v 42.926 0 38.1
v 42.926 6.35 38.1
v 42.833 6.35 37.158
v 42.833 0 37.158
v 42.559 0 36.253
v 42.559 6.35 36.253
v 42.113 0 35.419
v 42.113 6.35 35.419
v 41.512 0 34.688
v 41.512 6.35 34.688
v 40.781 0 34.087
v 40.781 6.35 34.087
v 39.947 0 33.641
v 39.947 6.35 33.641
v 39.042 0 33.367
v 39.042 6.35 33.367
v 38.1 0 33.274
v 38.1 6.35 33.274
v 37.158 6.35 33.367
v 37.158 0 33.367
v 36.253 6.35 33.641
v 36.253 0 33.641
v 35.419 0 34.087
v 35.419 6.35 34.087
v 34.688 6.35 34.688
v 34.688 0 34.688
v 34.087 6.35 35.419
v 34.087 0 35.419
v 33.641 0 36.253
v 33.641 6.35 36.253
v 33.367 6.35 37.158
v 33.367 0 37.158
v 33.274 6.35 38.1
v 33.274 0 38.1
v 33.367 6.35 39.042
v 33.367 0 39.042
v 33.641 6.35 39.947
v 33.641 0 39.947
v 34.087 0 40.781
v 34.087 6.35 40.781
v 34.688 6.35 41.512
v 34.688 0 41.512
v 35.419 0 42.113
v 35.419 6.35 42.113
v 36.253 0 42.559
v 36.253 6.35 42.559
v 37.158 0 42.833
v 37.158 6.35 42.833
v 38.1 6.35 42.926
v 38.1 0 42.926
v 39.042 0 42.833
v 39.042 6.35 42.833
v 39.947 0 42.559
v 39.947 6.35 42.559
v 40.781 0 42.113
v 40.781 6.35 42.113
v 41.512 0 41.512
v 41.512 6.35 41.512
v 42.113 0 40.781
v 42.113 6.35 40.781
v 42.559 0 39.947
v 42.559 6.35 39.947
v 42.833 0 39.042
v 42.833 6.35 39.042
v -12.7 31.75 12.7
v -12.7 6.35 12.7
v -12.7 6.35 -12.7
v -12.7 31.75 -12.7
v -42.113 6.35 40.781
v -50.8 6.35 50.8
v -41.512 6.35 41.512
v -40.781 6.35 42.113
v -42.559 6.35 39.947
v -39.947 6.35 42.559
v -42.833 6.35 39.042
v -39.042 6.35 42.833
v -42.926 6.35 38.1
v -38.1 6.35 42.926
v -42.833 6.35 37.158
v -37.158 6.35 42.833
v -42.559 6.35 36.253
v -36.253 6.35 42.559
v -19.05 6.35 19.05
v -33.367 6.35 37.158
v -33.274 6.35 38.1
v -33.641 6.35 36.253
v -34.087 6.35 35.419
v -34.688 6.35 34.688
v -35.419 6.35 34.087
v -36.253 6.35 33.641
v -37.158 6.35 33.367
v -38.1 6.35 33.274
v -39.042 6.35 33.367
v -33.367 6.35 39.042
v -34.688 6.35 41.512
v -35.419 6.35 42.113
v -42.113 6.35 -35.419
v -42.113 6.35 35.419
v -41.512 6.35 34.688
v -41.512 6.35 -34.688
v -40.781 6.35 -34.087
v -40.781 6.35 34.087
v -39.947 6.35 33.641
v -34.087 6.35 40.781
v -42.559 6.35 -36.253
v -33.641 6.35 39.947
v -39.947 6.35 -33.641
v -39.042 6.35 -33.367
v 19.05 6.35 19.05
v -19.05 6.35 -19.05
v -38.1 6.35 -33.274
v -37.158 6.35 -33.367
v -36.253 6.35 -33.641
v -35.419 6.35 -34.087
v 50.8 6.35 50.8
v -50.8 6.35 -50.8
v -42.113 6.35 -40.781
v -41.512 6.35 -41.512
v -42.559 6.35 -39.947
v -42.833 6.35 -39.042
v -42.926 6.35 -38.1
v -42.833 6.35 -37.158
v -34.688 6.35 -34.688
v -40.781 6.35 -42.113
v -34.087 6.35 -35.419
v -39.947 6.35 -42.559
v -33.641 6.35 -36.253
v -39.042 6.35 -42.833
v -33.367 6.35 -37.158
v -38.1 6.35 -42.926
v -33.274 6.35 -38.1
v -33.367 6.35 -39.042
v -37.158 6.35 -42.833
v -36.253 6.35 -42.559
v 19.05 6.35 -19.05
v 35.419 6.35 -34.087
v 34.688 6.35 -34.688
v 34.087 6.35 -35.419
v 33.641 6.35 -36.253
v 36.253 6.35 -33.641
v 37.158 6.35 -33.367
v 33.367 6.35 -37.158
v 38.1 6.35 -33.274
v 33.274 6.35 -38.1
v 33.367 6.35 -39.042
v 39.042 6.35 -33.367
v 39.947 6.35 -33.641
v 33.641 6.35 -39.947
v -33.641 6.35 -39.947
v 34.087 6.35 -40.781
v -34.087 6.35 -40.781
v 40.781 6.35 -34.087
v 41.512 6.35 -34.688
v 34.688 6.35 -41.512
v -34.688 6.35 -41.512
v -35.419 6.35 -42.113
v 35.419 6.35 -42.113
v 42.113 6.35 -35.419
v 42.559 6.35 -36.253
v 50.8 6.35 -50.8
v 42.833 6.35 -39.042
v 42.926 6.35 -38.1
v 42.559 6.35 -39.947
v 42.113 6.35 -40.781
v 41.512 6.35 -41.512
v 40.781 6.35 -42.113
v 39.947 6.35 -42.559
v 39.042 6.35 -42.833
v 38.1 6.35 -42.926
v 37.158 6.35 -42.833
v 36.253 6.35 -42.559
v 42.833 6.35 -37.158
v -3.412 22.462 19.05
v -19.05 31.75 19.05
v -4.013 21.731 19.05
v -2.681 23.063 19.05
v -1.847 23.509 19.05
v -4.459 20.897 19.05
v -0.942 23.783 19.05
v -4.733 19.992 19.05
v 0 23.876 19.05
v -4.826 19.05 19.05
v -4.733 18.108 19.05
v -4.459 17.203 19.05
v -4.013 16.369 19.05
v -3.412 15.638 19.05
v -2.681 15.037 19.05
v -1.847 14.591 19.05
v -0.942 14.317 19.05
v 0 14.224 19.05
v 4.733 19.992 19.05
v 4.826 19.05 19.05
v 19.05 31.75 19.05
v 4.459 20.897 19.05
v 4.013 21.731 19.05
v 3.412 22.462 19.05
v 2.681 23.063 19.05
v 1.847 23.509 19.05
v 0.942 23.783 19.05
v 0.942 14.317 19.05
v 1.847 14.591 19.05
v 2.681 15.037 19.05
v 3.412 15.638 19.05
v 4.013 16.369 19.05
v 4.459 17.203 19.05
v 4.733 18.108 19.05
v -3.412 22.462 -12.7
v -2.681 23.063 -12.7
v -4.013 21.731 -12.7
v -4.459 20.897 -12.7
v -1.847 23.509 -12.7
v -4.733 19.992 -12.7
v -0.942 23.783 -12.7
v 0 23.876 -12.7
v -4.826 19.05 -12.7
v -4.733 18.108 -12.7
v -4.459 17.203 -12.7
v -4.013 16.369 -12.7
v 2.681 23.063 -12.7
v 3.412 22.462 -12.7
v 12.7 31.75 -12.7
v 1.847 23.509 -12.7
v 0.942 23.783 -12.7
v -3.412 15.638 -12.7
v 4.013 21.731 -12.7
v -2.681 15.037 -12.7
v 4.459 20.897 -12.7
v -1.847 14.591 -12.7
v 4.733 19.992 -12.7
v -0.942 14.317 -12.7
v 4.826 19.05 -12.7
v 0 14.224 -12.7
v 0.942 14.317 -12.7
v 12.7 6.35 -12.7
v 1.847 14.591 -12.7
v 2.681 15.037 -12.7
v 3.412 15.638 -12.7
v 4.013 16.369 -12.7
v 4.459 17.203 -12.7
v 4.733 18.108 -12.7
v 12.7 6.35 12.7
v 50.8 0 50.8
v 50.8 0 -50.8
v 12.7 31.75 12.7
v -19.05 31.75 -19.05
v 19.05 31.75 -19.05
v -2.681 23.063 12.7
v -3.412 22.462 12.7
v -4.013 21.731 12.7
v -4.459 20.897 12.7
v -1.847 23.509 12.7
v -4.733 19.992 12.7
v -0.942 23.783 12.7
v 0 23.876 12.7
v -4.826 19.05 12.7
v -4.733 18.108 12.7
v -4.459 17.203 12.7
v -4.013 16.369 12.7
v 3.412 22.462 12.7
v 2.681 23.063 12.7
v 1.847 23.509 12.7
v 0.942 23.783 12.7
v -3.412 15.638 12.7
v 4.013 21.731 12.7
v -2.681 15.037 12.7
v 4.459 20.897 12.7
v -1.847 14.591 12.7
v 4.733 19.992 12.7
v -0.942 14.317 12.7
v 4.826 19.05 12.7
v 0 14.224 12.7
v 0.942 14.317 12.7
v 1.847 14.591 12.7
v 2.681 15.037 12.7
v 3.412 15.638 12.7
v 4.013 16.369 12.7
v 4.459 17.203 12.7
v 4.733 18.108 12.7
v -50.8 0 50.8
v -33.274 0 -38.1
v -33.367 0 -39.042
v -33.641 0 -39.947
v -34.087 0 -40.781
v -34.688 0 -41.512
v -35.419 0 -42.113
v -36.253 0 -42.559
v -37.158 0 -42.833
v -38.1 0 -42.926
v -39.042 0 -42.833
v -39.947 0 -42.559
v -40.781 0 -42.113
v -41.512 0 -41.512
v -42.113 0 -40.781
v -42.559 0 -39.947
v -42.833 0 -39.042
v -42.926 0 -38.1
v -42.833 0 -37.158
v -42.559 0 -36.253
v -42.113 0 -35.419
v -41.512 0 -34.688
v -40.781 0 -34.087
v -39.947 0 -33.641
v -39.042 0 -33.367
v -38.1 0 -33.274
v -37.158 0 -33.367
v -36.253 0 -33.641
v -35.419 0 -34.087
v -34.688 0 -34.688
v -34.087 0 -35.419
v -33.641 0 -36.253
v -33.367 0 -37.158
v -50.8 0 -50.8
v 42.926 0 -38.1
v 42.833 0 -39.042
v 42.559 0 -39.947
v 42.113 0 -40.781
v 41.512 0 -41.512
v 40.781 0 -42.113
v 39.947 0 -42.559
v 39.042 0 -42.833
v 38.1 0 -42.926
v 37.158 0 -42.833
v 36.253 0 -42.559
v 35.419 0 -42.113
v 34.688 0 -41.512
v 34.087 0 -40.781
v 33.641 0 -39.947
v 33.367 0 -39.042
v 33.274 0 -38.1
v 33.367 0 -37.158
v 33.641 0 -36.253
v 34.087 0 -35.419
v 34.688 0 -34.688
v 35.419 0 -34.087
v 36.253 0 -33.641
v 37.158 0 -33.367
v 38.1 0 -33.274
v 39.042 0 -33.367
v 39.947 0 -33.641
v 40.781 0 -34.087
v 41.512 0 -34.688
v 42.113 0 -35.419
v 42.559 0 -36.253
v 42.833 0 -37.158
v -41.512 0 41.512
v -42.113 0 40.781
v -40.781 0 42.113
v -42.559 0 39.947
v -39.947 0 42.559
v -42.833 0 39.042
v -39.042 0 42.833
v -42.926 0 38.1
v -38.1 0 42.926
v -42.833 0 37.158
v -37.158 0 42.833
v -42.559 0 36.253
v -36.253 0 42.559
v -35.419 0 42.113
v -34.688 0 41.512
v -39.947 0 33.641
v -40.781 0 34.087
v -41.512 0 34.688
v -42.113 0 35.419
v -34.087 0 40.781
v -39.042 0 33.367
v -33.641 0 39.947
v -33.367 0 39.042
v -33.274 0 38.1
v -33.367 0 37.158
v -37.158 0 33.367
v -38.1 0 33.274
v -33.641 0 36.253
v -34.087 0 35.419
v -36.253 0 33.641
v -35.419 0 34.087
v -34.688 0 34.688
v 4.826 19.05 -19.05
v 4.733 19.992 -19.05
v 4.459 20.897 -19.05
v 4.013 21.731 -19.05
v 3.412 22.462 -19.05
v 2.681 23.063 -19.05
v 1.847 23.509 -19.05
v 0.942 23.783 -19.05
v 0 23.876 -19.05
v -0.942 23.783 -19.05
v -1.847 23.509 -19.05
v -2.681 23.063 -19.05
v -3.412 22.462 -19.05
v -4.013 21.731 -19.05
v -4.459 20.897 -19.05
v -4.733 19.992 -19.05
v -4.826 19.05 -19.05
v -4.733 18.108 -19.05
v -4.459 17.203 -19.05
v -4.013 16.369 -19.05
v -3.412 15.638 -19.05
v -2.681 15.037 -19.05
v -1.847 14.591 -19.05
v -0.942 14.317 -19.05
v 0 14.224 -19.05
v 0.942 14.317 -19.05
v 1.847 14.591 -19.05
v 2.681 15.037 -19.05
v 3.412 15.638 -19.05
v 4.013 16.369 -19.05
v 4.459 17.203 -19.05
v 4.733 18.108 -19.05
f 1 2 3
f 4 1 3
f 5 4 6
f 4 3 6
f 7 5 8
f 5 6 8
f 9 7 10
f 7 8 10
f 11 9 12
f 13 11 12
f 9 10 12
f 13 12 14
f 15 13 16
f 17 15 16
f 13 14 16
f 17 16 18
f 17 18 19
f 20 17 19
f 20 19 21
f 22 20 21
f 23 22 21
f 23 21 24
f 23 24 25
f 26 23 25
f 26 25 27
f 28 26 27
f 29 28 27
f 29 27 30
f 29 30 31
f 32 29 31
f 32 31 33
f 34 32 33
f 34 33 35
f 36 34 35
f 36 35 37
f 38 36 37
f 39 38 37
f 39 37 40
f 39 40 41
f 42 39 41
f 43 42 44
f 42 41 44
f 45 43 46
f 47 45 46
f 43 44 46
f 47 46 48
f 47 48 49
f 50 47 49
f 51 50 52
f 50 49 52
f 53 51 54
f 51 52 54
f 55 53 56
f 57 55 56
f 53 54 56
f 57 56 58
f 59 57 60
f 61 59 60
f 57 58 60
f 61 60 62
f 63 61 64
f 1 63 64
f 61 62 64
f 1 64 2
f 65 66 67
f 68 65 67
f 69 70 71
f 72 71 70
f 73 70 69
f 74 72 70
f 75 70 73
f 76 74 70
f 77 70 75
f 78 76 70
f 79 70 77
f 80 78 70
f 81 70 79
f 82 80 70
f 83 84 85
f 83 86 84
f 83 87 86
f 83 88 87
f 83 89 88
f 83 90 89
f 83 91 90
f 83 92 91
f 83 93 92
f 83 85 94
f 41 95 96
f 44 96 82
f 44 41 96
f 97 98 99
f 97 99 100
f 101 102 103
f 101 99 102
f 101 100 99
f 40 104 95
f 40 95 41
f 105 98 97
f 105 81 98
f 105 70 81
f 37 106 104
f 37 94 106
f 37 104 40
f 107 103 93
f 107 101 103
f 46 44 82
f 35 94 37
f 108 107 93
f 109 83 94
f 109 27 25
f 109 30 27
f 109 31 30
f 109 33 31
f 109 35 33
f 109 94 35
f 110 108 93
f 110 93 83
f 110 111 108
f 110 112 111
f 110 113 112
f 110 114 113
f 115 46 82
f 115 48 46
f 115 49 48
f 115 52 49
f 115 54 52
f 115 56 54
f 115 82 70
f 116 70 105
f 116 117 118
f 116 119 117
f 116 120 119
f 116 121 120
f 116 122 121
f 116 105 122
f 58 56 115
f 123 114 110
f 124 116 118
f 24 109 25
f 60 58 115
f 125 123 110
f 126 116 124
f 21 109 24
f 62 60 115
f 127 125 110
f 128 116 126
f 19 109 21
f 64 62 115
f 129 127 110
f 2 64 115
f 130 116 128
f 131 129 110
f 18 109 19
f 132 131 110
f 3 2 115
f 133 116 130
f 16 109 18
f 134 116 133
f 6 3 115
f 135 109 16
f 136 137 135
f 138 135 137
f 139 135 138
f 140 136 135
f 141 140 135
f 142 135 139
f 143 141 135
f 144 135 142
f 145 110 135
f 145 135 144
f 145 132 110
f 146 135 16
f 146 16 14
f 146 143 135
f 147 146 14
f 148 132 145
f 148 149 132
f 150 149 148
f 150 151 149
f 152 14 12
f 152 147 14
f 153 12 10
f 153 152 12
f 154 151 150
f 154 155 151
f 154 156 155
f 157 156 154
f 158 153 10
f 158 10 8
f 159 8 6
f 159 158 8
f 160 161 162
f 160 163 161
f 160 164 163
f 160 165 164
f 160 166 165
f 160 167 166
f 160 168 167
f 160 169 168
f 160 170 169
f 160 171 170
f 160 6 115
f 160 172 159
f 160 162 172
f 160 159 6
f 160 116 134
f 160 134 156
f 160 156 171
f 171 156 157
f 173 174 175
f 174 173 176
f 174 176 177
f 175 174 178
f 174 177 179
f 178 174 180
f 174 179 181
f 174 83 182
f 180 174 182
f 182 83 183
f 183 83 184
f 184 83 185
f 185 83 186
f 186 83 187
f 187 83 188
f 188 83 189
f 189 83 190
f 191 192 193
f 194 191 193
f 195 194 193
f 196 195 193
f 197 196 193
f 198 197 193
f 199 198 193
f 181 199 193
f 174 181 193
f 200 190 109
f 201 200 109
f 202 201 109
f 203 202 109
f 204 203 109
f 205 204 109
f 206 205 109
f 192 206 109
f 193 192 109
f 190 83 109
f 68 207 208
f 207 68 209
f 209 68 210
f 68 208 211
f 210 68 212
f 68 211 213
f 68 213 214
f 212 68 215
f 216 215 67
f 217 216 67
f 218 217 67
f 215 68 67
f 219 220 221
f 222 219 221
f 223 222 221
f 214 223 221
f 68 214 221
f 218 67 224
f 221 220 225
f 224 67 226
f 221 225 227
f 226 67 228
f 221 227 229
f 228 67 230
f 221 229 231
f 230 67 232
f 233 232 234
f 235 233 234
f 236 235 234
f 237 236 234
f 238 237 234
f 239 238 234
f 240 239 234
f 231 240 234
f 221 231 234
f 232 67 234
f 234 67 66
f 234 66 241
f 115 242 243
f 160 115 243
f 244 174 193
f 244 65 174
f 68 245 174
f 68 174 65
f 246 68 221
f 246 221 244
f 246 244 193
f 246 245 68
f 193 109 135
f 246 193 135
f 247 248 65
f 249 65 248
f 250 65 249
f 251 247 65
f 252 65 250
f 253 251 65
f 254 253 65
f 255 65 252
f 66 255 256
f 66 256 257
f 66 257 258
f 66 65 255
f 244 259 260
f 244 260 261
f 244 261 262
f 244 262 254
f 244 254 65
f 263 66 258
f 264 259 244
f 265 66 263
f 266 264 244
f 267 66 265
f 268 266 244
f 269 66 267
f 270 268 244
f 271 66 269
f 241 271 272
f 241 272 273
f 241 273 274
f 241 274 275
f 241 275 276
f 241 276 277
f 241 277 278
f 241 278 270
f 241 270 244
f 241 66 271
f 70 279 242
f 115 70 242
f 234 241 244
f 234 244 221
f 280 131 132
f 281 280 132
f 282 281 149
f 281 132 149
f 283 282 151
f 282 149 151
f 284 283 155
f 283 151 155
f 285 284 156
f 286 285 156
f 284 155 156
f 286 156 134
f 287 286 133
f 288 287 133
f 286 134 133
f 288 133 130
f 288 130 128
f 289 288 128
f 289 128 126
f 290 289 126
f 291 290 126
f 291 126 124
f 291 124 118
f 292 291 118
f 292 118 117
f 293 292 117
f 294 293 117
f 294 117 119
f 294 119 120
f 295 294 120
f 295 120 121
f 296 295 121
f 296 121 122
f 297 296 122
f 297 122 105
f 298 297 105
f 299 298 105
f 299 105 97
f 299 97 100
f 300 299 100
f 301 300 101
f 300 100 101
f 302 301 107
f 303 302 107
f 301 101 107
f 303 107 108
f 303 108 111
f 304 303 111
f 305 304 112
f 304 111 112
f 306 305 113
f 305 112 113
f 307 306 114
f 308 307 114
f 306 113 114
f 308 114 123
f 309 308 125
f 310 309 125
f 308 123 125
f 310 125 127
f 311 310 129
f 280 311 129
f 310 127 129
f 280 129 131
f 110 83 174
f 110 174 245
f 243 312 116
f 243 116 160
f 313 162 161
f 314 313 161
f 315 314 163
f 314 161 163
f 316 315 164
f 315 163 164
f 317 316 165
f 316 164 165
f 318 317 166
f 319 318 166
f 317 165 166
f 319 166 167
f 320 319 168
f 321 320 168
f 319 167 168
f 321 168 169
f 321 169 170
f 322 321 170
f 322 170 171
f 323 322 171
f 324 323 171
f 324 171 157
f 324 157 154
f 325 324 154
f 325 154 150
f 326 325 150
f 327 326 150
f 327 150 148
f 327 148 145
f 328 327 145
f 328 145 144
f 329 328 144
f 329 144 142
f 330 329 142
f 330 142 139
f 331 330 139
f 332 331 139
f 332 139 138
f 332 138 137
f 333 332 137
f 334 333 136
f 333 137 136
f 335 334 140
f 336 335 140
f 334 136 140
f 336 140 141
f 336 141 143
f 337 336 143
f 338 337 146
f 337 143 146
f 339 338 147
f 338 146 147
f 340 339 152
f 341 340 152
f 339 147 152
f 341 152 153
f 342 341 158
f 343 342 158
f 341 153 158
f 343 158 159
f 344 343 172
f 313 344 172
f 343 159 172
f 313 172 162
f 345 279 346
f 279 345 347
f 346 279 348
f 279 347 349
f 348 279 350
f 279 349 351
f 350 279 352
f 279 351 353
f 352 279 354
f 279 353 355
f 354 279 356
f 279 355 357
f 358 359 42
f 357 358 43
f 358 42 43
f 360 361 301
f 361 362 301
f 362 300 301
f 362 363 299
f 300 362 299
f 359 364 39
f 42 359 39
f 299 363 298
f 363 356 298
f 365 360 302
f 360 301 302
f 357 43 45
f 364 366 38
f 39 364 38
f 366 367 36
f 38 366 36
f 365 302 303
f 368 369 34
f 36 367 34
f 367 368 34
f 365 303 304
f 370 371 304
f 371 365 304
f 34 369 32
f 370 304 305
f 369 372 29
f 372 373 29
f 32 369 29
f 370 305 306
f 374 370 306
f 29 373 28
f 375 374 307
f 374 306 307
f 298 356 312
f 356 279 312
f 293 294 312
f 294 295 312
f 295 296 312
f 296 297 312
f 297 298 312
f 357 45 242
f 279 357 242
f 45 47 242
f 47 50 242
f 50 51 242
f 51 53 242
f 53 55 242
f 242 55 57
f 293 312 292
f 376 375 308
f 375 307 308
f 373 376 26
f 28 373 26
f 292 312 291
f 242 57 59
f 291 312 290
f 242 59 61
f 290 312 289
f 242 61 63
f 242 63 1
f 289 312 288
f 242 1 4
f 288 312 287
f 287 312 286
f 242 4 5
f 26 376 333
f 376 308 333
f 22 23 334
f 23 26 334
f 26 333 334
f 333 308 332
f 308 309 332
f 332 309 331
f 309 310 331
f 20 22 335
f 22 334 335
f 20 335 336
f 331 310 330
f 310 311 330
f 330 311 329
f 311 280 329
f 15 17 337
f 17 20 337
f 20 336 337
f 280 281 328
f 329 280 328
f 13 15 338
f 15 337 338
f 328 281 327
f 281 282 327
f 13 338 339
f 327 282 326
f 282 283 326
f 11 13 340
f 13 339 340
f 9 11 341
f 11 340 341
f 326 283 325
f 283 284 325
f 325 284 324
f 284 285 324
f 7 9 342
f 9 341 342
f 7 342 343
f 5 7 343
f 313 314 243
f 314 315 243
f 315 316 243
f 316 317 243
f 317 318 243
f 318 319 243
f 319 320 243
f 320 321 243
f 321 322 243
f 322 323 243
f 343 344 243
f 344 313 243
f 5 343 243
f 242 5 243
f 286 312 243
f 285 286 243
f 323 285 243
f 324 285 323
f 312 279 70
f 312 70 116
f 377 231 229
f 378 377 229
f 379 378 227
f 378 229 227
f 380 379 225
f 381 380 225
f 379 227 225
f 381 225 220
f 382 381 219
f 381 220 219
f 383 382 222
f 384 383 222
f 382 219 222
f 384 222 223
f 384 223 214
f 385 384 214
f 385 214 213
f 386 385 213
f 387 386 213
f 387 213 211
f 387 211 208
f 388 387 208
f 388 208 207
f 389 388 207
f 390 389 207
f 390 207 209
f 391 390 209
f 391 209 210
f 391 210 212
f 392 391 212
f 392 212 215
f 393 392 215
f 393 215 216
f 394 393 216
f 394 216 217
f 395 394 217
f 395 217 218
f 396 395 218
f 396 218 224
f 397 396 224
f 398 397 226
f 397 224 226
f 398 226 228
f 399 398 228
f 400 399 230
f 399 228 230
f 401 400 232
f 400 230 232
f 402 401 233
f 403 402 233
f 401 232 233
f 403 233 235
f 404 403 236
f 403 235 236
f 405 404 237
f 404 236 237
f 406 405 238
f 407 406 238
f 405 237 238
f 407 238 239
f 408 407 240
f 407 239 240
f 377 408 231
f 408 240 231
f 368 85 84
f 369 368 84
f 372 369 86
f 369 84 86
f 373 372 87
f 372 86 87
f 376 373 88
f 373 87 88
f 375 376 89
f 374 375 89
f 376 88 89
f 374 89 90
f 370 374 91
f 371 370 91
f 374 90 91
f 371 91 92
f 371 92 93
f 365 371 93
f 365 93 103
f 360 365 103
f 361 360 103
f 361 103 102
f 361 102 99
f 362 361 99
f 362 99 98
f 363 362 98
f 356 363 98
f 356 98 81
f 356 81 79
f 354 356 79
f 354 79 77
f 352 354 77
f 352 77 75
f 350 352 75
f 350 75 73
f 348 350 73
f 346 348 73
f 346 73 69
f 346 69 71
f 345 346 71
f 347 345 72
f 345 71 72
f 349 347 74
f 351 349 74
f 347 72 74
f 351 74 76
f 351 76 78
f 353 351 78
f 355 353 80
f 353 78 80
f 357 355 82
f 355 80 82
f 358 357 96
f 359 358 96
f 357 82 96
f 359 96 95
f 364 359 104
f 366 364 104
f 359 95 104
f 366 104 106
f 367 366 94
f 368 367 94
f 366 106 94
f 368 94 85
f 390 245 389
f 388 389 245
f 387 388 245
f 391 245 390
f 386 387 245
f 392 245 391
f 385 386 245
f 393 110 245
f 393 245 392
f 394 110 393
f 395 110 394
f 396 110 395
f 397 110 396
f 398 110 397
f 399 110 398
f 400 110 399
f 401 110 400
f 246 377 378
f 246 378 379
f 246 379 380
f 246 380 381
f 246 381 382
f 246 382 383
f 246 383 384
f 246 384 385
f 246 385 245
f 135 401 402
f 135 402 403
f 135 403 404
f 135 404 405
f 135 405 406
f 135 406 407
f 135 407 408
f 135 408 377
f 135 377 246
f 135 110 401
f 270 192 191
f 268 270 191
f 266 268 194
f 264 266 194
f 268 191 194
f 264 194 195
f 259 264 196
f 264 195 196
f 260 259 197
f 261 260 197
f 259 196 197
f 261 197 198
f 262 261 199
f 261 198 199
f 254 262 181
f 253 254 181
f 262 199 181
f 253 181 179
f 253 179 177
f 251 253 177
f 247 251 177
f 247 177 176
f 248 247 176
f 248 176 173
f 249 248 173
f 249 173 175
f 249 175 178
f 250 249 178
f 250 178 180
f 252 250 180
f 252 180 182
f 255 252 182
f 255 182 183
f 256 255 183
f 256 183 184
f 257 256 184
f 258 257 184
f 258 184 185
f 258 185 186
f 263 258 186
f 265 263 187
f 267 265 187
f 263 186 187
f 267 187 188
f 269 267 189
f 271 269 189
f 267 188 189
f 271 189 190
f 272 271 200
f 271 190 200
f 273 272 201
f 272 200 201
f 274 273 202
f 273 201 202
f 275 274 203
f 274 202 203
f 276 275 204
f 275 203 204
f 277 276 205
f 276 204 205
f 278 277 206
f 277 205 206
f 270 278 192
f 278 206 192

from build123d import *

# Parameters (mm, degrees)
SKETCH1_W               = 101.6
SKETCH1_H               = 101.6
BOSS_EXTRUDE1_DEPTH     = 6.35
SKETCH2_W               = 38.1
SKETCH2_H               = 38.1
SKETCH2_W_2             = 25.4
SKETCH2_H_2             = 25.4
BOSS_EXTRUDE2_DEPTH     = 25.4
SKETCH3_R               = 4.826
CUT_EXTRUDE1_DEPTH      = 32.75
CUT_EXTRUDE1_DEPTH_BACK = 70.85
SKETCH4_R               = 4.826
CUT_EXTRUDE2_DEPTH      = 25.4


with BuildPart() as part:
    # Sketch1 → Boss-Extrude1 (new body)
    with BuildSketch(Plane(origin=(0, 0, 0), x_dir=(1, 0, 0), z_dir=(0, 1, 0))):
        Rectangle(SKETCH1_W, SKETCH1_H)
    extrude(amount=BOSS_EXTRUDE1_DEPTH)

    # Sketch2 → Boss-Extrude2 (add)
    with BuildSketch(Plane(origin=(0, 6.35, 0), x_dir=(1, 0, 0), z_dir=(0, 1, 0))):
        Rectangle(SKETCH2_W, SKETCH2_H)
        Rectangle(SKETCH2_W_2, SKETCH2_H_2, mode=Mode.SUBTRACT)
    extrude(amount=BOSS_EXTRUDE2_DEPTH)

    # Sketch3 → Cut-Extrude1 (cut, two sides)
    with BuildSketch(Plane.XY.offset(19.05)) as cut_extrude1_sk:
        with Locations((0, 19.05)):
            Circle(SKETCH3_R)
    extrude(amount=CUT_EXTRUDE1_DEPTH, mode=Mode.SUBTRACT)
    extrude(cut_extrude1_sk.sketch, amount=-CUT_EXTRUDE1_DEPTH_BACK, mode=Mode.SUBTRACT)

    # Sketch4 → Cut-Extrude2 (cut)
    with BuildSketch(Plane(origin=(0, 6.35, 0), x_dir=(1, 0, 0), z_dir=(0, 1, 0))):
        with Locations((-38.1, 38.1)):
            Circle(SKETCH4_R)
        with Locations((38.1, 38.1)):
            Circle(SKETCH4_R)
        with Locations((38.1, -38.1)):
            Circle(SKETCH4_R)
        with Locations((-38.1, -38.1)):
            Circle(SKETCH4_R)
    extrude(amount=-CUT_EXTRUDE2_DEPTH, mode=Mode.SUBTRACT)


solid = part.part
